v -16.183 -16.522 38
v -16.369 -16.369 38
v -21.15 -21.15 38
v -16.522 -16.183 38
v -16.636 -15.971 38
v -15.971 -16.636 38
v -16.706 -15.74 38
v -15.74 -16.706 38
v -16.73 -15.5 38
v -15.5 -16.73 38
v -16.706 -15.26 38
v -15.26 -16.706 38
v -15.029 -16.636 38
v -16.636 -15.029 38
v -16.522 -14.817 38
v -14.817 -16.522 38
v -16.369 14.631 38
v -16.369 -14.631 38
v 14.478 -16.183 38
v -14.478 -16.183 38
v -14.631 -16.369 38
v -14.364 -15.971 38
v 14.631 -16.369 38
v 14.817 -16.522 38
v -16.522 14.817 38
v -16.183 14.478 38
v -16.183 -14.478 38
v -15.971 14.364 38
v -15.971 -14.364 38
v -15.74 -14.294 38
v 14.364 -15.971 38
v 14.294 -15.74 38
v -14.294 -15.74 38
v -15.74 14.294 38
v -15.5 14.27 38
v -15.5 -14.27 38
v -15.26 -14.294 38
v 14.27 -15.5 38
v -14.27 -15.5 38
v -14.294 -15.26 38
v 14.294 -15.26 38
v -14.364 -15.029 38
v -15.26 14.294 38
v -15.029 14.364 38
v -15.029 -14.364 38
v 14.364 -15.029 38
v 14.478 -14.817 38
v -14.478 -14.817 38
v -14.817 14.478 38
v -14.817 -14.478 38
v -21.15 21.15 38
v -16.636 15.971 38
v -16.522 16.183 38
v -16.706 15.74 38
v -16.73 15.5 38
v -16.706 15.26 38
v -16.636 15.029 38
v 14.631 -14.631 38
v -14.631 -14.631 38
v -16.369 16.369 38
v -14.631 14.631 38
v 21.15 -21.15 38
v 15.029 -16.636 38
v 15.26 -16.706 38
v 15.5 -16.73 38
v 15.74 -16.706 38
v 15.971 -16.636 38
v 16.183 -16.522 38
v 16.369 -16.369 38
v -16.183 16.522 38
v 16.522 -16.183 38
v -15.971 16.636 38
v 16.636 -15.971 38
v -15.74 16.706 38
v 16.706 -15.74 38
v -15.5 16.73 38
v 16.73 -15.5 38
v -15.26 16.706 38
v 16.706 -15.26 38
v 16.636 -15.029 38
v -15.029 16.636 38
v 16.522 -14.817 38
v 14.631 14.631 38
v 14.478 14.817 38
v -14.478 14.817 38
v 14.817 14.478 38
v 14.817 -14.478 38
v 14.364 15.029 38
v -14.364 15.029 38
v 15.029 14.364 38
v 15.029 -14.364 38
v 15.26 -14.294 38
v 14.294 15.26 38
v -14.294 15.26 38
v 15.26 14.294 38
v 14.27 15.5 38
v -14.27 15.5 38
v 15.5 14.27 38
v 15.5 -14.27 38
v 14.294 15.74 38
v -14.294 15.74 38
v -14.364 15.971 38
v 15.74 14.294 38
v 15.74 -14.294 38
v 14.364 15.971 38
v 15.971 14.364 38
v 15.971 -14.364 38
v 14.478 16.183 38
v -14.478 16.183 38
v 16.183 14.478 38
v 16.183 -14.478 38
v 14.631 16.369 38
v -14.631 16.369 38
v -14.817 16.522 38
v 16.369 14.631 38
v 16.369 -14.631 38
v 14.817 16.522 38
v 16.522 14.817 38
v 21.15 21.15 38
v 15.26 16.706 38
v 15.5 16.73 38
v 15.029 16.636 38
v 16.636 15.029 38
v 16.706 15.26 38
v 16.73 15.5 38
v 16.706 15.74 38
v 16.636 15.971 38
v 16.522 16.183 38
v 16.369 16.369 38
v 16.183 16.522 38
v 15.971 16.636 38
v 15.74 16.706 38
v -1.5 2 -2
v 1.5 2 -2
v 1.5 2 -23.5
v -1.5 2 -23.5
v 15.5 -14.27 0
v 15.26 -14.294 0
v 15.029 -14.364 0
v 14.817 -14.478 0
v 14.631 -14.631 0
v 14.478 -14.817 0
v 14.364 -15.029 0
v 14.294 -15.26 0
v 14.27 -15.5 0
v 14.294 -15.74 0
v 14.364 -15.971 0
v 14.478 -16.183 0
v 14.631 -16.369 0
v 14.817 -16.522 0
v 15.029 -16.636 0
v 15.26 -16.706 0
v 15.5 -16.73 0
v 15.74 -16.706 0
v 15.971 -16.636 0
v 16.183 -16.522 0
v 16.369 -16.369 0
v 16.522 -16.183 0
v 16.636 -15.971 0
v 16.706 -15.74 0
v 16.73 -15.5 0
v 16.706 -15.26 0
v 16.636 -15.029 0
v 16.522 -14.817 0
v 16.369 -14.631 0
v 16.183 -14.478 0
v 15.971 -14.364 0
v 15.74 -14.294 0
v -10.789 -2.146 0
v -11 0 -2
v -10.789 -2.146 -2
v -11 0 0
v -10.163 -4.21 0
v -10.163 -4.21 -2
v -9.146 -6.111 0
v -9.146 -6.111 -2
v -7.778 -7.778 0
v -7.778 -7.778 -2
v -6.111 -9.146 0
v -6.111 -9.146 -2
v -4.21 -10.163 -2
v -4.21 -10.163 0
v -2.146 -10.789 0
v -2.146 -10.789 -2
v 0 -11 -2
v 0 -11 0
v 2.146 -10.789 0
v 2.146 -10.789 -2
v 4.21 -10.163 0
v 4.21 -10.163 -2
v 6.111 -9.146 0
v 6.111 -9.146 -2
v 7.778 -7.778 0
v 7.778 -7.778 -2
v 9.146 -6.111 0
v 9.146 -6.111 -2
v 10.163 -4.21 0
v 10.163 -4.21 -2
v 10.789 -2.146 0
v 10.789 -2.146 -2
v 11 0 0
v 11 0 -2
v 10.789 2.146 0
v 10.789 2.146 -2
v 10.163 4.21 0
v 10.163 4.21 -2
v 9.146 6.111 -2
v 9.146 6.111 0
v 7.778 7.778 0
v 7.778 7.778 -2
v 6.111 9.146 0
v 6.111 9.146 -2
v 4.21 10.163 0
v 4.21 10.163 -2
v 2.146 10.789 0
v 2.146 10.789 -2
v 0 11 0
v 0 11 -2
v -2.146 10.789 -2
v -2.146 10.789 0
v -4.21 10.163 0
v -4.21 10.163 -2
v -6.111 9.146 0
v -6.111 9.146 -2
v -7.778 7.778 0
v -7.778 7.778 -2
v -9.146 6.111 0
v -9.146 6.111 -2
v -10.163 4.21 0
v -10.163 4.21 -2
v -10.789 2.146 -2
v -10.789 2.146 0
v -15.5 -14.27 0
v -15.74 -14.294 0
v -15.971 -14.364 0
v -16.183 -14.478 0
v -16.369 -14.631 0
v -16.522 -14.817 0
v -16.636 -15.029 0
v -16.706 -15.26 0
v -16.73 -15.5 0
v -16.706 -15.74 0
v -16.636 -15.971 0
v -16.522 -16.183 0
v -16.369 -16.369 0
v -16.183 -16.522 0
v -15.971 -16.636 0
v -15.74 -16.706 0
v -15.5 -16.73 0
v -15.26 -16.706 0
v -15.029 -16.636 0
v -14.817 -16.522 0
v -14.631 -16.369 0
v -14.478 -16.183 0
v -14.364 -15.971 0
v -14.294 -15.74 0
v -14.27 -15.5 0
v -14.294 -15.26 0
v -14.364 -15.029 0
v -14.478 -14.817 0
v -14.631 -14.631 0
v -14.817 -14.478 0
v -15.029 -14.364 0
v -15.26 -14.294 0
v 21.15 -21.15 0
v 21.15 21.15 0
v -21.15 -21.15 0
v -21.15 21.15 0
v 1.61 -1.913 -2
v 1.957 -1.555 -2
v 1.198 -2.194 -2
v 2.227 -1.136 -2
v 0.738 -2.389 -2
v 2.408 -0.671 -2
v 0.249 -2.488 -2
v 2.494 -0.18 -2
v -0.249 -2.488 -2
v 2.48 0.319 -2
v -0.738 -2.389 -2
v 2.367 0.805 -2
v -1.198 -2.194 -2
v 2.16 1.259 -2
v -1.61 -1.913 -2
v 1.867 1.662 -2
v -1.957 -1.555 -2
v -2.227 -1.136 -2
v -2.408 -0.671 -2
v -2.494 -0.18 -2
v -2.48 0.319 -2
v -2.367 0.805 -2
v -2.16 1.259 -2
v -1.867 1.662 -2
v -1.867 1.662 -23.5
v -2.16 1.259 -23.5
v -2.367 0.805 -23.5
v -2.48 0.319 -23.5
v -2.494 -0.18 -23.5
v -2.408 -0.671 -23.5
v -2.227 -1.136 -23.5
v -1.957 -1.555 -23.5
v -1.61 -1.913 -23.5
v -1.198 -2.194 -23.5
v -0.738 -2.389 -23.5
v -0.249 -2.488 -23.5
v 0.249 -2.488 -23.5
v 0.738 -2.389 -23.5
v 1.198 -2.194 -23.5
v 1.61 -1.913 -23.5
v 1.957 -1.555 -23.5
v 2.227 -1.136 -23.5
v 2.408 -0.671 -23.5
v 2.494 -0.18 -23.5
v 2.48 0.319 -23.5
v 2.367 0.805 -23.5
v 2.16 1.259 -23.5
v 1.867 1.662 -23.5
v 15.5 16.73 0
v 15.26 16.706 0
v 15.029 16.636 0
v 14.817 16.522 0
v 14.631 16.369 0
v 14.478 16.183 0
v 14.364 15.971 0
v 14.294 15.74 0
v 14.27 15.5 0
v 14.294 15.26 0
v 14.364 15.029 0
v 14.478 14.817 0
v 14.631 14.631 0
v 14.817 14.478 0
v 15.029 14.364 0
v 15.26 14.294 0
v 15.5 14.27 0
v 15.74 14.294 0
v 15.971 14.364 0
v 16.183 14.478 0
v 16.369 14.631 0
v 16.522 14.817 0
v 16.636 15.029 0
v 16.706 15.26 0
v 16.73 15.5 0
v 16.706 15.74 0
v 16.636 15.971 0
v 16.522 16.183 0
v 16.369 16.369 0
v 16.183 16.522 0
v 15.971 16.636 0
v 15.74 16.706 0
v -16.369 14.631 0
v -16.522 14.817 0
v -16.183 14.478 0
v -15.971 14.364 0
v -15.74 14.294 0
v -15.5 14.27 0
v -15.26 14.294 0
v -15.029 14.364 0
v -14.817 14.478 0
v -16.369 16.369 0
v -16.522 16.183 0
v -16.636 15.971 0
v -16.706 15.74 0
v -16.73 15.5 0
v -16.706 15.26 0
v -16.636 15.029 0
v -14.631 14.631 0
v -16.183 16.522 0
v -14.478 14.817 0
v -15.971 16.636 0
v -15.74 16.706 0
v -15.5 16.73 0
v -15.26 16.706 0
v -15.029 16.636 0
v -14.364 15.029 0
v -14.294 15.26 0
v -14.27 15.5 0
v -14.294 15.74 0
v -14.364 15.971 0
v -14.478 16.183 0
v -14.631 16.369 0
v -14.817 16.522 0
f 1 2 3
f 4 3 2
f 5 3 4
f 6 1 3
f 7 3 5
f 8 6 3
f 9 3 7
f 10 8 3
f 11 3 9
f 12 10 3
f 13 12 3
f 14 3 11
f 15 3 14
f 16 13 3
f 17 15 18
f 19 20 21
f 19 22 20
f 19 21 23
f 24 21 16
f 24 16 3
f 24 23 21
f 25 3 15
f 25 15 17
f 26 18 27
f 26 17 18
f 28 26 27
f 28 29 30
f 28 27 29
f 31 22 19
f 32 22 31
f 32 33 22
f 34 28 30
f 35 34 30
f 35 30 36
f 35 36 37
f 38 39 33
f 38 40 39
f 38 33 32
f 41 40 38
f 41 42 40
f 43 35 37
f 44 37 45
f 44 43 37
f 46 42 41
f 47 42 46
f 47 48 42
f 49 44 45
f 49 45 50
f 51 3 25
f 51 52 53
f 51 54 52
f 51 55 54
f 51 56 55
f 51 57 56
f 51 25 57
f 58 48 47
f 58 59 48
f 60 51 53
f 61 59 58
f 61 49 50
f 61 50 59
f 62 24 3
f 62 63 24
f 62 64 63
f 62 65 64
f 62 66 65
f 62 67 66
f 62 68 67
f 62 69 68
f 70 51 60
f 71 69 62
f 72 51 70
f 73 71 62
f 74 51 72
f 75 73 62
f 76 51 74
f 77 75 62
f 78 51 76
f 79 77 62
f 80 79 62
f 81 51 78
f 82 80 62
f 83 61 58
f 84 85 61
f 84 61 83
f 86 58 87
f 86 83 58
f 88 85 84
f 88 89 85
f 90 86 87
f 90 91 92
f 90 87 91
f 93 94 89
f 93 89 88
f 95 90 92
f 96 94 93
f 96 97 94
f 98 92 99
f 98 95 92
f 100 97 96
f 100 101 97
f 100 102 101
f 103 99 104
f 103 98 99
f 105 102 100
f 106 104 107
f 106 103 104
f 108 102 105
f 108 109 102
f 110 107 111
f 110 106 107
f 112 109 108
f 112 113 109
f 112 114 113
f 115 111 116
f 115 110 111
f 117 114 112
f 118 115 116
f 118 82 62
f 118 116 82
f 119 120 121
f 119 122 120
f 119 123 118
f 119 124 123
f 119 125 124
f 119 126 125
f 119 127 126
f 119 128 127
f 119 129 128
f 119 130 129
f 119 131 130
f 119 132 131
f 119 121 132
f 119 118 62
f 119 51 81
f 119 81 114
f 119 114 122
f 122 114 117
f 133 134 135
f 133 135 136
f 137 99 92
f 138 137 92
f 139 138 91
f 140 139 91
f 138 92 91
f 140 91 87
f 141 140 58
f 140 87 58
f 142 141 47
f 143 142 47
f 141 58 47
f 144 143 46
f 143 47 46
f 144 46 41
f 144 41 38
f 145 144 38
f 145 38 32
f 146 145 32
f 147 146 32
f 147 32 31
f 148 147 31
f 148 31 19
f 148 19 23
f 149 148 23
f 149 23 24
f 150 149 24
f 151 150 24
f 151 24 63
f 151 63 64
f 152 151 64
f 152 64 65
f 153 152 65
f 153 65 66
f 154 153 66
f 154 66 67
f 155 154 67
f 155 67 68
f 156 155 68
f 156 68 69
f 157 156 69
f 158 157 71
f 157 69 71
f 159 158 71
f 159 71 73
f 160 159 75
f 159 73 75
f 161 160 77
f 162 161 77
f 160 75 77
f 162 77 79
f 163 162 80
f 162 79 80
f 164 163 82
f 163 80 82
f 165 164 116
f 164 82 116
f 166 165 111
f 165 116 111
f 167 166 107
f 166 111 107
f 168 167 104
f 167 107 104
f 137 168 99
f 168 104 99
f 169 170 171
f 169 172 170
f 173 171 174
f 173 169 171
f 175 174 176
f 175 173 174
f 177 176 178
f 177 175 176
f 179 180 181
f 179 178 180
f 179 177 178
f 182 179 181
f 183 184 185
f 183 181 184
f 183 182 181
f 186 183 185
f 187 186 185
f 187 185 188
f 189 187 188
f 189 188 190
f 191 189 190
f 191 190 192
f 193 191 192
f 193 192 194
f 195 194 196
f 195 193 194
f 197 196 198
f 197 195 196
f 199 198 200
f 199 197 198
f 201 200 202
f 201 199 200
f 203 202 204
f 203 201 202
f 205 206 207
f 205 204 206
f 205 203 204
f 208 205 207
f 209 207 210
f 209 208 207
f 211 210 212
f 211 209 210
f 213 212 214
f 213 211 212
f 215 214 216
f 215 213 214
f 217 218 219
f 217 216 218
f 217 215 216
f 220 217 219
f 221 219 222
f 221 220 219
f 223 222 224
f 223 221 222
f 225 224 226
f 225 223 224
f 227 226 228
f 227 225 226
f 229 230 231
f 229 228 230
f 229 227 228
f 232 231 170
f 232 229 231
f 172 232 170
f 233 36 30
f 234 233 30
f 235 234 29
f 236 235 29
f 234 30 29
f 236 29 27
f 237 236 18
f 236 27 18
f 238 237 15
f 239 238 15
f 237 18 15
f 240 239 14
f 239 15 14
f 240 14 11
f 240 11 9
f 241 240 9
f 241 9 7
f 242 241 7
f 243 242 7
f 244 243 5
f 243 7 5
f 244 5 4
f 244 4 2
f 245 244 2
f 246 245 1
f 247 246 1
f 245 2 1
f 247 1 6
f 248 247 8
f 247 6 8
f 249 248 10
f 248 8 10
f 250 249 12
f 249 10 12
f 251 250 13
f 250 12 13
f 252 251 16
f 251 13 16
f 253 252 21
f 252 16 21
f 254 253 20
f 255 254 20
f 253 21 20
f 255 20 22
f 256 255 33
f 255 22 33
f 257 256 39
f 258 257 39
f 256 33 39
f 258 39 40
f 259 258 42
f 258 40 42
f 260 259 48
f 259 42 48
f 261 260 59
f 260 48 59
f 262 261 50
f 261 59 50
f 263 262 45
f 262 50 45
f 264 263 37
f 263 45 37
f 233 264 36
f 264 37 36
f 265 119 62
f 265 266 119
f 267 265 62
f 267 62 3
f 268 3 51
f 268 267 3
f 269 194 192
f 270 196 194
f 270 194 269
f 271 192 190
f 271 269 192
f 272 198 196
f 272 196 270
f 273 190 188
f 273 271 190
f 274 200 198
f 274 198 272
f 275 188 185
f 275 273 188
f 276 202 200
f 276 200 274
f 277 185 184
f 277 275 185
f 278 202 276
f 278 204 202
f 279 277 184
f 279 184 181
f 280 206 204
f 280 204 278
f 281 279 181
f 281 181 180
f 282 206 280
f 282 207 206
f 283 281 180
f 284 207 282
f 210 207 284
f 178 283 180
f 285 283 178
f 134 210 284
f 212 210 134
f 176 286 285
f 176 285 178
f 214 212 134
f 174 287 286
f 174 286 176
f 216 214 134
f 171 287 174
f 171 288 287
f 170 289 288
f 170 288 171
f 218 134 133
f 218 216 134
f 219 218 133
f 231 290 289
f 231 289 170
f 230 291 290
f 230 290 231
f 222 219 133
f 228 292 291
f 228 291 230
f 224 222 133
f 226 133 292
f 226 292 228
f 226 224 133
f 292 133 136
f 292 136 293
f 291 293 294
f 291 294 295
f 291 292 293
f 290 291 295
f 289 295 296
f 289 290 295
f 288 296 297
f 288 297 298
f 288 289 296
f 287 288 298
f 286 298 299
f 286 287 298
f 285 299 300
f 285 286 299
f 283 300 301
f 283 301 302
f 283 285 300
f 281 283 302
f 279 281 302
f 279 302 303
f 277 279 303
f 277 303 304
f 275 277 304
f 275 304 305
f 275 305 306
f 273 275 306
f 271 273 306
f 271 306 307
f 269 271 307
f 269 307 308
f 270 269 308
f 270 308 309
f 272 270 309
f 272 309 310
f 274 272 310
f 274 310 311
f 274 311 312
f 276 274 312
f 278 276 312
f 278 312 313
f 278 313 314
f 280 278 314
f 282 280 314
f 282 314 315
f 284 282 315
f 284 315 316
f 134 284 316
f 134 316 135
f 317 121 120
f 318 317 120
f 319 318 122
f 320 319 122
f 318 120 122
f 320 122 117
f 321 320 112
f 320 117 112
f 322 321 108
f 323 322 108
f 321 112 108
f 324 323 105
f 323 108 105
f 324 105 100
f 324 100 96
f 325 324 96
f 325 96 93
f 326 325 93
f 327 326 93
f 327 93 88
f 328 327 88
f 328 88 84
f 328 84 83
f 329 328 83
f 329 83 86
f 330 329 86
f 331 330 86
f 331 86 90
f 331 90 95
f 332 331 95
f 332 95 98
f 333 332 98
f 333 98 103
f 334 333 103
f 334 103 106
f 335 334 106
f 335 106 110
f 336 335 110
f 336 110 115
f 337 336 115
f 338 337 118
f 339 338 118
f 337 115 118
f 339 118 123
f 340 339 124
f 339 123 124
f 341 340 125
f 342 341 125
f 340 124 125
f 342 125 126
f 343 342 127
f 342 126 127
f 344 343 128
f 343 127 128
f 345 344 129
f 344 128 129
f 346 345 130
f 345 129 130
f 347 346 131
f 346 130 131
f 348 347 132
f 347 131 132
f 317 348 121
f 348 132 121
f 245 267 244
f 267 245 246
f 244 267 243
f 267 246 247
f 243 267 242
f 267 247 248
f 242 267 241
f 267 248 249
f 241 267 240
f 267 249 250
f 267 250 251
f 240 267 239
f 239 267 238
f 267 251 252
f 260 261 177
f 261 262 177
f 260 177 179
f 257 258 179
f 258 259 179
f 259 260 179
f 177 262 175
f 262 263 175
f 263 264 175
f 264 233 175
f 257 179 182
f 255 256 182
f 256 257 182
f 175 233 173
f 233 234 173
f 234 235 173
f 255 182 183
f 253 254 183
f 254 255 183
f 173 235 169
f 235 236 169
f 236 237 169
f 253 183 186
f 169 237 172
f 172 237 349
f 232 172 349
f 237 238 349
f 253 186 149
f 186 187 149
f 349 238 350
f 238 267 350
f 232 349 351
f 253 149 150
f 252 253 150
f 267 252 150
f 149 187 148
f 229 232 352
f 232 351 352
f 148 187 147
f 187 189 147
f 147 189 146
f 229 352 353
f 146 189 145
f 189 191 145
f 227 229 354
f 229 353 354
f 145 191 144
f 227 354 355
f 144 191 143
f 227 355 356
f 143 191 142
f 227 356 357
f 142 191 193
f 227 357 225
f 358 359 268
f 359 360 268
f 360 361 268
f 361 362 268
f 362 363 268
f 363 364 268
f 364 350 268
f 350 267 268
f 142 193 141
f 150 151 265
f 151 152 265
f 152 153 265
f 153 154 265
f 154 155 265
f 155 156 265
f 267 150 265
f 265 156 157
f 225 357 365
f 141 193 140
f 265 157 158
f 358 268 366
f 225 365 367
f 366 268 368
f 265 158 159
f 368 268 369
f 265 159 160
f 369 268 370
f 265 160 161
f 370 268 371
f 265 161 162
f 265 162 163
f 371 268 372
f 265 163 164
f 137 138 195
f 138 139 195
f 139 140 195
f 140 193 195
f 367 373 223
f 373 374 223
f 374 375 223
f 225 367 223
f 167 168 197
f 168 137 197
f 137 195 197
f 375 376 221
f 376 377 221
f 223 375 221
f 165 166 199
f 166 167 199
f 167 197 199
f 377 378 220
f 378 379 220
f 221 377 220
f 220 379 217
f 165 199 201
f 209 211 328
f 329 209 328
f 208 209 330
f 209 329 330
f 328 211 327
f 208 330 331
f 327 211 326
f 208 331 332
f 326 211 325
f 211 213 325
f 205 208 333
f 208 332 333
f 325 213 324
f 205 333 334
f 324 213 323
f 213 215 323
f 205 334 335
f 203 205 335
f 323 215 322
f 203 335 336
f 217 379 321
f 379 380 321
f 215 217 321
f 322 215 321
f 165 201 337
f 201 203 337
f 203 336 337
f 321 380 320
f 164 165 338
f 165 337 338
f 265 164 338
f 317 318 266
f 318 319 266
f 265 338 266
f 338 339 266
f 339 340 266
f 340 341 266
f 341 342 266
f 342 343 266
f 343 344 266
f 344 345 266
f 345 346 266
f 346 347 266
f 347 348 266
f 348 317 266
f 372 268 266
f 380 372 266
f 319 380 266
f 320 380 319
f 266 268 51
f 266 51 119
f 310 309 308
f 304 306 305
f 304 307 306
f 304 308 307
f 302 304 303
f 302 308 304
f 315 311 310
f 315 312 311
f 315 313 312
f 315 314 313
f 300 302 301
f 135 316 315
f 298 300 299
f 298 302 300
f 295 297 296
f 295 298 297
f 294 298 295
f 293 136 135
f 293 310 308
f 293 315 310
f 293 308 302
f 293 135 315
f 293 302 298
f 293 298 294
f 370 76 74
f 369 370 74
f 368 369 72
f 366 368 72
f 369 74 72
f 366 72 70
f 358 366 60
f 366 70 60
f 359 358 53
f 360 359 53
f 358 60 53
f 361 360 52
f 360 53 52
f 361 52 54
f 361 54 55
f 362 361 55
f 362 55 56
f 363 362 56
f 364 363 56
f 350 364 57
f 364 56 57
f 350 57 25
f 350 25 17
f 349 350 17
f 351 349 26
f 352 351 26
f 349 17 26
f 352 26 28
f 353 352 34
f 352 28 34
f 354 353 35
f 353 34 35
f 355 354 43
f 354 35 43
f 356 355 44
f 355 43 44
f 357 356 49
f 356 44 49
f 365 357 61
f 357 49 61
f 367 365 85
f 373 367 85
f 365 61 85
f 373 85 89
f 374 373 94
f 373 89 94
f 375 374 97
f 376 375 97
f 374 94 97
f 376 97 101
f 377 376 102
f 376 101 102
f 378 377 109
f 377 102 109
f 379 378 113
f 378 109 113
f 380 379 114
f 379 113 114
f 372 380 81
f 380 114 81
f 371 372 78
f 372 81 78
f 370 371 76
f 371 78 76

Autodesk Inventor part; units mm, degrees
ref_plane "YZ Plane" through (0, 0, 0) normal (1, 0, 0) x (0, 1, 0)
ref_plane "XZ Plane" through (0, 0, 0) normal (0, 1, 0) x (-1, 0, 0)
ref_plane "XY Plane" through (0, 0, 0) normal (0, 0, 1) x (1, 0, 0)
sketch "Sketch1" plane through (0, 0, 0) normal (0, 0, 1) x (1, 0, 0)
  line L0 (21.15, -21.15) -> (-21.15, -21.15)
  line L1 (-21.15, -21.15) -> (-21.15, 21.15)
  line L2 (-21.15, 21.15) -> (21.15, 21.15)
  line L3 (21.15, 21.15) -> (21.15, -21.15)
  line L4 (21.15, -21.15) -> (-21.15, 21.15) construction
  line L5 (-21.15, -21.15) -> (21.15, 21.15) construction
  point P0 (0, 0)
  dimension "d0" = 42.3
extrude "Extrusion1" add sketch "Sketch1" along normal blind 38
sketch "Sketch2" plane through (0, 0, 0) normal (0, 0, -1) x (-1, 0, 0)
  line L0 (15.5, -15.5) -> (-15.5, -15.5)
  line L1 (-15.5, -15.5) -> (-15.5, 15.5)
  line L2 (-15.5, 15.5) -> (15.5, 15.5)
  line L3 (15.5, 15.5) -> (15.5, -15.5)
  line L4 (15.5, -15.5) -> (-15.5, 15.5) construction
  line L5 (-15.5, -15.5) -> (15.5, 15.5) construction
  point P0 (0, 0)
  dimension "d3" = 31
hole "Hole1" at (15.5, 15.5, 0) at (-15.5, 15.5, 0) at (-15.5, -15.5, 0) at (15.5, -15.5, 0) direction (0, 0, 1) diameter 2.459 end through all thread size "M3x0.5" class "6H" standard "ANSI Metric M Profile"
sketch "Sketch3" plane through (0, 0, 0) normal (0, 0, -1) x (-1, 0, 0)
  circle A0 centre (0, 0) radius 11
  dimension "d11" = 22
extrude "Extrusion2" add sketch "Sketch3" along normal blind 2
sketch "Sketch4" plane through (0, 0, -2) normal (0, 0, -1) x (-1, 0, 0)
  circle A0 centre (0, 0) radius 2.5
  line L0 (-1.5, 2) -> (1.5, 2)
  dimension "d14" = 5
  dimension "d15" = 4.5
extrude "Extrusion3" add sketch "Sketch4" along normal blind 21.5 contours A0 L0 picked at (0.1119, 0.5076)
properties part number "NEMA17"
